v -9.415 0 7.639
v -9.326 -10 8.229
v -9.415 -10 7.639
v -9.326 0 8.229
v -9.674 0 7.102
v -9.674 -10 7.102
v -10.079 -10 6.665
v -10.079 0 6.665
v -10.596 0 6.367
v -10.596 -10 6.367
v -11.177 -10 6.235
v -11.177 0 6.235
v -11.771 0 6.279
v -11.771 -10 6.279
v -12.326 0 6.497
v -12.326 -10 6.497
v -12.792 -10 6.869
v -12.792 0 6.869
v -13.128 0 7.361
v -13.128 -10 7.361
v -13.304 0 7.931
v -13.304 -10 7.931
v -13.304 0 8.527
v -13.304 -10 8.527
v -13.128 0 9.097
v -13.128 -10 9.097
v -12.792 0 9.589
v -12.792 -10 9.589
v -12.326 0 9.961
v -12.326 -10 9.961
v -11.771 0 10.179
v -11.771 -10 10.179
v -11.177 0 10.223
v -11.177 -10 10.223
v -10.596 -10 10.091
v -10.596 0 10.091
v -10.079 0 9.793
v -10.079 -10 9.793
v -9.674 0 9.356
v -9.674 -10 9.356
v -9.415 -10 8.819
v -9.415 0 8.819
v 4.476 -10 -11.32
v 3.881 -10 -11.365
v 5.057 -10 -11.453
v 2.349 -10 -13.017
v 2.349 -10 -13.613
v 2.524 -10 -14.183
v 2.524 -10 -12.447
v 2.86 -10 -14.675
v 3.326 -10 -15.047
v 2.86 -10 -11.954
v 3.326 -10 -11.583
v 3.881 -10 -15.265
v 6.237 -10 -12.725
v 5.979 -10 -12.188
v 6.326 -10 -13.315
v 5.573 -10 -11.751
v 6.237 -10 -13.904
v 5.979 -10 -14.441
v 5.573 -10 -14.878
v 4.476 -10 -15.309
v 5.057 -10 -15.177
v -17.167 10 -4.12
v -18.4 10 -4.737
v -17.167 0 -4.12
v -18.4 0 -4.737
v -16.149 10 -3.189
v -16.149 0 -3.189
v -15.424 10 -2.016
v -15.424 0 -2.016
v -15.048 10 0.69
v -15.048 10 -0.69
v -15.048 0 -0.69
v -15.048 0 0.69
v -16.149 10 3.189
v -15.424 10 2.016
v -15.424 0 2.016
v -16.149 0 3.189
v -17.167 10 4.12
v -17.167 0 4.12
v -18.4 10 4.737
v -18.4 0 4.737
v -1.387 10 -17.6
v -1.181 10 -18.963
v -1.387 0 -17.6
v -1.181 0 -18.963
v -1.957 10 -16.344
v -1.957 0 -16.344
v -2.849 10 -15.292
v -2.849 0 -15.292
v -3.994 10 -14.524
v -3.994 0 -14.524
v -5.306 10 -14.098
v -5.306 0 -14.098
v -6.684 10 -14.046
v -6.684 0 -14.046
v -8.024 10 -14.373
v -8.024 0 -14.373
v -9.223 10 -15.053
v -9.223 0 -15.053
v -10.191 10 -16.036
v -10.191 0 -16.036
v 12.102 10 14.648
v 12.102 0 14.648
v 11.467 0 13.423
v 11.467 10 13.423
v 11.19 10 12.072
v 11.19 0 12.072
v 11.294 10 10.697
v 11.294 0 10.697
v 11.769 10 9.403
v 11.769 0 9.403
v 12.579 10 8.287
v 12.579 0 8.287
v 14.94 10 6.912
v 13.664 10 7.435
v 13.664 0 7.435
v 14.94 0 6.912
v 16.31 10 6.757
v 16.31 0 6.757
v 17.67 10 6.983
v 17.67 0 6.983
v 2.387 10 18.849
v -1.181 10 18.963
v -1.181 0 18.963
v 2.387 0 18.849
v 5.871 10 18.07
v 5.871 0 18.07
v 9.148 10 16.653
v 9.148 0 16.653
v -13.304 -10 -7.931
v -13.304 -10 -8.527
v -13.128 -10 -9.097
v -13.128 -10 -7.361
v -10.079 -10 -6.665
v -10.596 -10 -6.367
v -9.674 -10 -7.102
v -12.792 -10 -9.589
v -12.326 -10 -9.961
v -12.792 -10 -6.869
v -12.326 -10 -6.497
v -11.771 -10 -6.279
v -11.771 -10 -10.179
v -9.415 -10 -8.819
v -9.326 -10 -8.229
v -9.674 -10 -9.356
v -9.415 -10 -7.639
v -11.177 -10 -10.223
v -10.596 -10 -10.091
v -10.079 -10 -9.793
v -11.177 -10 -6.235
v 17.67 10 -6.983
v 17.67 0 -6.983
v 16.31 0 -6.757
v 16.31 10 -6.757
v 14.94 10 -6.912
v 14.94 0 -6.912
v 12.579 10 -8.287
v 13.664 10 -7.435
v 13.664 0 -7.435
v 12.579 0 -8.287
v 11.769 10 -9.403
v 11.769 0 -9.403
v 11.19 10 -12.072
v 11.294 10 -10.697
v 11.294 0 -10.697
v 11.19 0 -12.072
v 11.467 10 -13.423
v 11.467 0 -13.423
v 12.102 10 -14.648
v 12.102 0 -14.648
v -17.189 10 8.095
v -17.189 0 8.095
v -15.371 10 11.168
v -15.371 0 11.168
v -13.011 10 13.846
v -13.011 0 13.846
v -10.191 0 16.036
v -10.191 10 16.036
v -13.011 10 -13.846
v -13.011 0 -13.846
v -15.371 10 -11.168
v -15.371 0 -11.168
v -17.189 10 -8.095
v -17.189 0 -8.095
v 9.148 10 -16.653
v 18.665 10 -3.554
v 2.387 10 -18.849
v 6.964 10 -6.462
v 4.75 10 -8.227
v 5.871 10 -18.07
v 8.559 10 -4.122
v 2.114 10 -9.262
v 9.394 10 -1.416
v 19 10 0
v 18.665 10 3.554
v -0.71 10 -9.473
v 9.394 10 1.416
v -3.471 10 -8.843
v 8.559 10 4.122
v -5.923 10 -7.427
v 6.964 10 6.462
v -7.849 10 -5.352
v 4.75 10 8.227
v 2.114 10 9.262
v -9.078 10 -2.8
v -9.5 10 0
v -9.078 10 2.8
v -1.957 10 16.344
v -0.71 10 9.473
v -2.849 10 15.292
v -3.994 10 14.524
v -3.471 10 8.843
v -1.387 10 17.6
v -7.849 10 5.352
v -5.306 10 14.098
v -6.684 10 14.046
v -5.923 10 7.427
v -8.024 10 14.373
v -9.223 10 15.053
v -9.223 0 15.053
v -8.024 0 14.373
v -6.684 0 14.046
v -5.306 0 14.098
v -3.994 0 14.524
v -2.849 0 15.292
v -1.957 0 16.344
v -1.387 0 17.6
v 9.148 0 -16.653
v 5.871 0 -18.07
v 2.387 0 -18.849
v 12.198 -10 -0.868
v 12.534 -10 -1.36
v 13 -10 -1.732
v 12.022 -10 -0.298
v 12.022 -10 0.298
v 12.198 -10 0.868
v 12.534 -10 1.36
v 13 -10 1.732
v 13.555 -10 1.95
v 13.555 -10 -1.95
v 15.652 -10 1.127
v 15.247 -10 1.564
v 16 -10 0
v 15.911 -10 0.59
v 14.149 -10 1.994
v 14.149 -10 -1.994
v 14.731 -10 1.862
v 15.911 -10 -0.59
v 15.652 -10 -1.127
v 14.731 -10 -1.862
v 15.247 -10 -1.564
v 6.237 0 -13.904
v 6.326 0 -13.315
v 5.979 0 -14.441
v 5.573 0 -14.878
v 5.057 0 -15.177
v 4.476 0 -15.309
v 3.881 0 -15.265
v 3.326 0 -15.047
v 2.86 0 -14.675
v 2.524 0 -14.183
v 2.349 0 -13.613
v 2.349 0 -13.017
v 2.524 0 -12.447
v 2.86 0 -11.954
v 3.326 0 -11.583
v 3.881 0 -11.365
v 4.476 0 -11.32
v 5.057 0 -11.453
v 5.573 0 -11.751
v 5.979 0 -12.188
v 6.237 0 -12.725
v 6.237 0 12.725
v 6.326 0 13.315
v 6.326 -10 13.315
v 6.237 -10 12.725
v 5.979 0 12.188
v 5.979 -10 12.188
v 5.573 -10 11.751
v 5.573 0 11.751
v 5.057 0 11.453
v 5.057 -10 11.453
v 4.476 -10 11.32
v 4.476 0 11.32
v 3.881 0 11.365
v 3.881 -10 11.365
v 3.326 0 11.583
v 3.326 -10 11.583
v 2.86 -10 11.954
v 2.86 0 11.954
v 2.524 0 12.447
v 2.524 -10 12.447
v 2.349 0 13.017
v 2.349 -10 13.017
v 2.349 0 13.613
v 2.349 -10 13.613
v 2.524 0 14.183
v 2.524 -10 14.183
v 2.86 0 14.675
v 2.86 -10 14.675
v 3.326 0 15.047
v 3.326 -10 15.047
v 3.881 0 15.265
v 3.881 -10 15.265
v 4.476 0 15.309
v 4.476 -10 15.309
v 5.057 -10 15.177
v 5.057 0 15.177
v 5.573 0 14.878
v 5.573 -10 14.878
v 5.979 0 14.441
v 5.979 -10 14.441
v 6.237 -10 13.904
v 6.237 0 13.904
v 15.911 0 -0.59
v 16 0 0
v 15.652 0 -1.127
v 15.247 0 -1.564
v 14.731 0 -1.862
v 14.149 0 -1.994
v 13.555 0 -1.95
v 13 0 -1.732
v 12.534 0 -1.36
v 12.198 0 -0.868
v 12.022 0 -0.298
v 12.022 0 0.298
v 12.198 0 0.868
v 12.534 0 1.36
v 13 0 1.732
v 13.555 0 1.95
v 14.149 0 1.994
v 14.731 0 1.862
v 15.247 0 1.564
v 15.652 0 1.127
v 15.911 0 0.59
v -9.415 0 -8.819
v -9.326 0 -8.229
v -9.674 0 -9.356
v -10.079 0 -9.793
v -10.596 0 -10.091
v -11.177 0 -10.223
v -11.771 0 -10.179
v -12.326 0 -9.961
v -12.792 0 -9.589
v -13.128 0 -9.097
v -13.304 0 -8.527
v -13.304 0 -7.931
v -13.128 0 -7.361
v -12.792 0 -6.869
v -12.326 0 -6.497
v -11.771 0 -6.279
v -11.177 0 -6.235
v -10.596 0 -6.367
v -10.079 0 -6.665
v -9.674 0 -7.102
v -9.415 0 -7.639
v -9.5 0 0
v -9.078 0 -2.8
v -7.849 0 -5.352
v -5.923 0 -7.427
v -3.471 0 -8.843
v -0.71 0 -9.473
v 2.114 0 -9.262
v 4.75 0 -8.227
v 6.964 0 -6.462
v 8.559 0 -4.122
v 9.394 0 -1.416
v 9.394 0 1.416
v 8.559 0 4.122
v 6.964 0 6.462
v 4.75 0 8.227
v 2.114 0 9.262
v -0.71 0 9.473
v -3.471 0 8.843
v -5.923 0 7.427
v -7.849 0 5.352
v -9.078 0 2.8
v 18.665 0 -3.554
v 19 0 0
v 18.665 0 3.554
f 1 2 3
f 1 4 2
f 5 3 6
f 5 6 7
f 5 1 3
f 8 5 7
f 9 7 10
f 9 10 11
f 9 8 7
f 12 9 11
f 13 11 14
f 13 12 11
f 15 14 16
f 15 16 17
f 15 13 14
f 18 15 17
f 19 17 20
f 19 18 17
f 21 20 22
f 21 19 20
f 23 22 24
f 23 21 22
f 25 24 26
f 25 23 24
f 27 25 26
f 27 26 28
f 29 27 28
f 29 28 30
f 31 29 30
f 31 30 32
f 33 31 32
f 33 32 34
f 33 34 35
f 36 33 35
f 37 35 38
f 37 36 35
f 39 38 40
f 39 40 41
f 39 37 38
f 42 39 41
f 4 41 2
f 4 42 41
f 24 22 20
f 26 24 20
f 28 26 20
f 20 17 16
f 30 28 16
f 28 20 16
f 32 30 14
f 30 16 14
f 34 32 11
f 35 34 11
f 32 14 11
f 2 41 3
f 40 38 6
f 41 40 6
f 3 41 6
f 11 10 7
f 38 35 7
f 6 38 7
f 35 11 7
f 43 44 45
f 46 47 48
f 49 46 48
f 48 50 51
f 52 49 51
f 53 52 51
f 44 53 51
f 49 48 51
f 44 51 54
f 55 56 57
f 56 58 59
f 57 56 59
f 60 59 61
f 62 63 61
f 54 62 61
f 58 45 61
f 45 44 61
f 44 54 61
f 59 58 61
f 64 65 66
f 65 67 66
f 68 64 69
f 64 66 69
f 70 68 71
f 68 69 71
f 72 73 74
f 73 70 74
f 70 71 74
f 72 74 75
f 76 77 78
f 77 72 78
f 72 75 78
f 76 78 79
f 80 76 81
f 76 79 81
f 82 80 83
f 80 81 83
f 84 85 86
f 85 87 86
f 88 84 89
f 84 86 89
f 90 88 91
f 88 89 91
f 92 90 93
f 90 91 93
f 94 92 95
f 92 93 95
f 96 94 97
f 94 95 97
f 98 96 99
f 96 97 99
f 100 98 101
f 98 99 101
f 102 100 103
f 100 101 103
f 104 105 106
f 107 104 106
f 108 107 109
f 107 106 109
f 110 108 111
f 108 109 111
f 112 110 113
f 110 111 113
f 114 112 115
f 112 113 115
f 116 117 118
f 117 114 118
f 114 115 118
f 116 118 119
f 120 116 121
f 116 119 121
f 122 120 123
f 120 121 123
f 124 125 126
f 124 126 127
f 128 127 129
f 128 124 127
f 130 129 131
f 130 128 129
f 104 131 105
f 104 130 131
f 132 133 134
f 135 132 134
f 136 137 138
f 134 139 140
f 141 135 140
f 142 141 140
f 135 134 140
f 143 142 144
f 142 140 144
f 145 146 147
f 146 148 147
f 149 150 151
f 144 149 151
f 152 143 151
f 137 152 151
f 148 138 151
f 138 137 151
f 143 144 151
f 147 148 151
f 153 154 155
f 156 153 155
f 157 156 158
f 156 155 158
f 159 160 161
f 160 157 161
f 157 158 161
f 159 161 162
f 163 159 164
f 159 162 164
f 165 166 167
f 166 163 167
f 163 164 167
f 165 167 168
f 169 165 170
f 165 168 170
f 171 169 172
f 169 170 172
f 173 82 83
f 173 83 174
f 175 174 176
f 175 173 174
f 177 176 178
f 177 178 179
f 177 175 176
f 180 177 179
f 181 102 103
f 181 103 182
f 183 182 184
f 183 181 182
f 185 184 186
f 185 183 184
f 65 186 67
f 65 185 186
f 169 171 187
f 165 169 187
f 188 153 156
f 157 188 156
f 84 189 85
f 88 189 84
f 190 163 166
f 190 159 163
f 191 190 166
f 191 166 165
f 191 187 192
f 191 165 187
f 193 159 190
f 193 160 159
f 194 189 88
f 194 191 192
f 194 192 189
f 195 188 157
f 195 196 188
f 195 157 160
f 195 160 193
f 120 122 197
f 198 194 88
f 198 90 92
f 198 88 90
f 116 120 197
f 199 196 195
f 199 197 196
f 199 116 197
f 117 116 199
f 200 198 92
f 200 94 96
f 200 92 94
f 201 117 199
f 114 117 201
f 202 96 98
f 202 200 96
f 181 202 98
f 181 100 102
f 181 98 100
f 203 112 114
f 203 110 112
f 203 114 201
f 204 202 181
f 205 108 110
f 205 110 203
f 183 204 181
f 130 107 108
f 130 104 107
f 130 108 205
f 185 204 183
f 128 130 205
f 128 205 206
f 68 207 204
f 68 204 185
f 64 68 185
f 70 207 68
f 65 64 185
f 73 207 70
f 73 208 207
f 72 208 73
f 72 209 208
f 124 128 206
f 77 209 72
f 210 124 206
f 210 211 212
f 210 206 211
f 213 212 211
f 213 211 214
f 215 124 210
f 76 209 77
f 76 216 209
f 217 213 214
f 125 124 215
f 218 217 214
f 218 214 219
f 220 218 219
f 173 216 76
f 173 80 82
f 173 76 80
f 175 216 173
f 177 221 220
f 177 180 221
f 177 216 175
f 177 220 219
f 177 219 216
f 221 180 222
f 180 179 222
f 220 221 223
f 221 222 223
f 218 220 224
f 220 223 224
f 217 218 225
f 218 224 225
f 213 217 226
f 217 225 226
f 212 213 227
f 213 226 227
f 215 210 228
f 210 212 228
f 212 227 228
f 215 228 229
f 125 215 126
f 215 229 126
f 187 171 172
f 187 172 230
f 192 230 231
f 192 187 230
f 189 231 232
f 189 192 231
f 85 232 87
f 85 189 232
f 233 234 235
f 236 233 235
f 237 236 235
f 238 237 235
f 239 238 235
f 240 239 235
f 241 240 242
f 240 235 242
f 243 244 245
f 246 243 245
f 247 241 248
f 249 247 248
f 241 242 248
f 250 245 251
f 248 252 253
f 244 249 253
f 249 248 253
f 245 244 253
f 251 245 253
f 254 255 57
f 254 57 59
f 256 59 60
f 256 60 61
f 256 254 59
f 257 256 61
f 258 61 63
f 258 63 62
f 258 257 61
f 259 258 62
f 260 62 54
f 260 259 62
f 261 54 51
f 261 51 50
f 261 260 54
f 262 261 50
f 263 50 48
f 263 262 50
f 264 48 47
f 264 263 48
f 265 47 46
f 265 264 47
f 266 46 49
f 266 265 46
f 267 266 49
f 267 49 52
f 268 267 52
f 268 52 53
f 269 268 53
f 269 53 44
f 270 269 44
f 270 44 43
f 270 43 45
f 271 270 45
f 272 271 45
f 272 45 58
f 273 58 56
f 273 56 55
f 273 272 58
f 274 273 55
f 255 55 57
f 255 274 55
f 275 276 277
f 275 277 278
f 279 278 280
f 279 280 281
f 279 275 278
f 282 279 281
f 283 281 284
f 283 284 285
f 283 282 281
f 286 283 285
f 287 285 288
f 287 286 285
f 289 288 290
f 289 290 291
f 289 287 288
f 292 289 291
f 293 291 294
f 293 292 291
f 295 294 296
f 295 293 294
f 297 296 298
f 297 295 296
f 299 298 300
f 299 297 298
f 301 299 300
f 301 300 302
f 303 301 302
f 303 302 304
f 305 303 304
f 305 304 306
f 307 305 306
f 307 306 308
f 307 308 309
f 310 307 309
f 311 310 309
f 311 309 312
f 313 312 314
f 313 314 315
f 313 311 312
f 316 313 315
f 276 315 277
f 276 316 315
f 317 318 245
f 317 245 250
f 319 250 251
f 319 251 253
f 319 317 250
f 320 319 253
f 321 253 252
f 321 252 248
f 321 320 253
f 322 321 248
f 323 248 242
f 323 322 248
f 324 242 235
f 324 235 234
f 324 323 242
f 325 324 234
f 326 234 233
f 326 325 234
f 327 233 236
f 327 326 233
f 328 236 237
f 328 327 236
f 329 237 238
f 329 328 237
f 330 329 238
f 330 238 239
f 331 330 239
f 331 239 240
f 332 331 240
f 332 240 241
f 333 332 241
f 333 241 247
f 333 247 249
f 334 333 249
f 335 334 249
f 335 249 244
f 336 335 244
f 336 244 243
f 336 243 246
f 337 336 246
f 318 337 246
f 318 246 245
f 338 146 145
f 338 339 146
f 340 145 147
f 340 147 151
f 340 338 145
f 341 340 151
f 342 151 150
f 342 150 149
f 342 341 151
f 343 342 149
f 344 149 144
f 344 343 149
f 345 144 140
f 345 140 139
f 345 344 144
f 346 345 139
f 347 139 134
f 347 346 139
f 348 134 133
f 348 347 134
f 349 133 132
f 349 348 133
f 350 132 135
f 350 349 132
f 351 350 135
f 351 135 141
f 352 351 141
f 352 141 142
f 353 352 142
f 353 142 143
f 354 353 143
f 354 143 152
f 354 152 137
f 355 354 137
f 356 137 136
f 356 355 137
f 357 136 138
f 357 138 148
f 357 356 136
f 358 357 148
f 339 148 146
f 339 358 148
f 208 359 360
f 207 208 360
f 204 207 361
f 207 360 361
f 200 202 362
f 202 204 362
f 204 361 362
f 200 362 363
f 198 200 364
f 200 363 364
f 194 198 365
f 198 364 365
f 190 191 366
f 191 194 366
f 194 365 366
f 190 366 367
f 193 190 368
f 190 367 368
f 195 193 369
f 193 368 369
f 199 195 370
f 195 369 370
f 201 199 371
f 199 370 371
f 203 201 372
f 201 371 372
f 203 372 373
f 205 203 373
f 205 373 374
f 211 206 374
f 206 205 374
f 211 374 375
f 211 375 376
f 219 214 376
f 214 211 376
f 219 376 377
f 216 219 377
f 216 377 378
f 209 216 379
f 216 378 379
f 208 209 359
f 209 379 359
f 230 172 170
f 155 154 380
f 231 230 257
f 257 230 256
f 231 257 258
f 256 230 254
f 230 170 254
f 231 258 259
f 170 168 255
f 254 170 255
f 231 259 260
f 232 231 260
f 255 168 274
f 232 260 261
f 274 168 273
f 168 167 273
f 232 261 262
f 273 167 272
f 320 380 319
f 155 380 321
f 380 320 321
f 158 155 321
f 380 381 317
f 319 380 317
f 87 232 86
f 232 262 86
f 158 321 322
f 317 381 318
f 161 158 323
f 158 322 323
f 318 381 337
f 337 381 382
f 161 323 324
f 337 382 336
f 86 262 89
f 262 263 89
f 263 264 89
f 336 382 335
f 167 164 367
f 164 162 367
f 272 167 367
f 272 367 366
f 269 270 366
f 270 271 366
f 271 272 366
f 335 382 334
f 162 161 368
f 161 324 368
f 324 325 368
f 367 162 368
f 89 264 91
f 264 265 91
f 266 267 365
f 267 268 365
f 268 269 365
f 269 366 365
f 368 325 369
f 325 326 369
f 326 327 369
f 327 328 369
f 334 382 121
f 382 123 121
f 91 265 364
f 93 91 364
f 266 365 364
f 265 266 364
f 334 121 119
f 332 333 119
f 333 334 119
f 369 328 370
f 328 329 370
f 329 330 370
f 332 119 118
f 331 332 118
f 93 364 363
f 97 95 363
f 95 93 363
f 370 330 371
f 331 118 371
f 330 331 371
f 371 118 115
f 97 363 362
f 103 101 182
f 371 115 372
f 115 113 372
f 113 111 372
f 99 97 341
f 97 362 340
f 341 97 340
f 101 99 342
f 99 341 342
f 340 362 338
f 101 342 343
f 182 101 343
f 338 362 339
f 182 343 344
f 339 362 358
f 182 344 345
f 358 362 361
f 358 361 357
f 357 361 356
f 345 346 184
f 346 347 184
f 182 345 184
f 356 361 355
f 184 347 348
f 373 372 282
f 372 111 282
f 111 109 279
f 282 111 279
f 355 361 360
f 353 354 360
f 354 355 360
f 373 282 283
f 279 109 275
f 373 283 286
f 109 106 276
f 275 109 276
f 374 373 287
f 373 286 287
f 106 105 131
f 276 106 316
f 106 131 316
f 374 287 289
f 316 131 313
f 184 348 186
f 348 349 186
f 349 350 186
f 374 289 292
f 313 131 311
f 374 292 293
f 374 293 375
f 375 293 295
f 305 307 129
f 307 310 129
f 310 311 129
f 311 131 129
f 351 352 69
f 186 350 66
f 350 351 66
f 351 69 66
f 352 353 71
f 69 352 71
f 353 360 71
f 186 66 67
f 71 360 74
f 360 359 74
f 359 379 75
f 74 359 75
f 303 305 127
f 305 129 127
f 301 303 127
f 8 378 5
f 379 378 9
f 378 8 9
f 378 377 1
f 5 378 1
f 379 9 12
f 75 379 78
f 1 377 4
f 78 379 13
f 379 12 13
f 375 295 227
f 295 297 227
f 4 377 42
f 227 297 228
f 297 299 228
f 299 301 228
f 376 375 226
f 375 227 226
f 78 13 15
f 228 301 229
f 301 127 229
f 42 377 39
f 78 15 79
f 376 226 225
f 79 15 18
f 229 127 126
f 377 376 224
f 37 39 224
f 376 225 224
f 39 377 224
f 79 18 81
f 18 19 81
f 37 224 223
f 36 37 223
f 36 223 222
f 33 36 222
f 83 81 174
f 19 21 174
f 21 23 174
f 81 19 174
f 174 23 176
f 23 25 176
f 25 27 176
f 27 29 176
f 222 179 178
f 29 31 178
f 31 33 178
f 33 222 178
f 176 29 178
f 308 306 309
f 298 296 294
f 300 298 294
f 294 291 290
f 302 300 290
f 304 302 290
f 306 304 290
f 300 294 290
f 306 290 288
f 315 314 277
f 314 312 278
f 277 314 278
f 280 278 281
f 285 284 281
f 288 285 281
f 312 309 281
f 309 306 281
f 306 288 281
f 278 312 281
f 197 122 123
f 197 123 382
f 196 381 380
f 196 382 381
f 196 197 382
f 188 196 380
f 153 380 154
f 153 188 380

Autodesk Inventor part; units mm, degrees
ref_plane "YZ Plane" through (0, 0, 0) normal (1, 0, 0) x (0, 1, 0)
ref_plane "XZ Plane" through (0, 0, 0) normal (0, 1, 0) x (-1, 0, 0)
ref_plane "XY Plane" through (0, 0, 0) normal (0, 0, 1) x (1, 0, 0)
sketch "Эскиз1" plane through (0, 0, 0) normal (0, 1, 0) x (-1, 0, 0)
  circle A0 centre (0, 0) radius 9.5
  circle A1 centre (0, 0) radius 30
  circle A2 centre (0, 0) radius 20 construction
  circle A3 centre (19.9999, 0) radius 5
  circle A4 centre (6.1803, 19.021) radius 5
  circle A5 centre (-16.1803, 11.7557) radius 5
  circle A6 centre (-16.1803, -11.7557) radius 5
  circle A7 centre (6.1803, -19.021) radius 5
  dimension "d0" = 19
  dimension "d1" = 60
  dimension "d2" = 40
  dimension "d3" = 10
  dimension "d6" = 360
extrude "Выдавливание1" add sketch "Эскиз1" along normal blind 10
sketch "Эскиз2" plane through (0, 10, 0) normal (0, 1, 0) x (1, 0, 0)
  circle A0 centre (-6.1803, 19.021) radius 5 projected
  circle A1 centre (16.1803, 11.7557) radius 5 projected
  circle A2 centre (16.1803, -11.7557) radius 5 projected
  circle A3 centre (-6.1803, -19.021) radius 5 projected
  circle A4 centre (-19.9999, 0) radius 5 projected
  circle A5 centre (0, 0) radius 30 projected
  circle A6 centre (0, 0) radius 19
  dimension "d15" = 38
extrude "Выдавливание2" cut sketch "Эскиз2" against normal blind 10
sketch "Эскиз3" plane through (0, 10, 0) normal (0, 1, 0) x (1, 0, 0)
  circle A0 centre (0, 0) radius 9.5 projected
  circle A1 centre (14, 0) radius 2
  circle A2 centre (4.3262, 13.3148) radius 2
  circle A3 centre (-11.3262, 8.229) radius 2
  circle A4 centre (-11.3262, -8.229) radius 2
  circle A5 centre (4.3262, -13.3148) radius 2
  dimension "d17" = 4
  dimension "d18" = 14
  dimension "d21" = 360
extrude "Выдавливание3" add sketch "Эскиз3" against normal blind 20 contours A1 | A2 | A3 | A4 | A5
properties part number "Ротор цевков"
